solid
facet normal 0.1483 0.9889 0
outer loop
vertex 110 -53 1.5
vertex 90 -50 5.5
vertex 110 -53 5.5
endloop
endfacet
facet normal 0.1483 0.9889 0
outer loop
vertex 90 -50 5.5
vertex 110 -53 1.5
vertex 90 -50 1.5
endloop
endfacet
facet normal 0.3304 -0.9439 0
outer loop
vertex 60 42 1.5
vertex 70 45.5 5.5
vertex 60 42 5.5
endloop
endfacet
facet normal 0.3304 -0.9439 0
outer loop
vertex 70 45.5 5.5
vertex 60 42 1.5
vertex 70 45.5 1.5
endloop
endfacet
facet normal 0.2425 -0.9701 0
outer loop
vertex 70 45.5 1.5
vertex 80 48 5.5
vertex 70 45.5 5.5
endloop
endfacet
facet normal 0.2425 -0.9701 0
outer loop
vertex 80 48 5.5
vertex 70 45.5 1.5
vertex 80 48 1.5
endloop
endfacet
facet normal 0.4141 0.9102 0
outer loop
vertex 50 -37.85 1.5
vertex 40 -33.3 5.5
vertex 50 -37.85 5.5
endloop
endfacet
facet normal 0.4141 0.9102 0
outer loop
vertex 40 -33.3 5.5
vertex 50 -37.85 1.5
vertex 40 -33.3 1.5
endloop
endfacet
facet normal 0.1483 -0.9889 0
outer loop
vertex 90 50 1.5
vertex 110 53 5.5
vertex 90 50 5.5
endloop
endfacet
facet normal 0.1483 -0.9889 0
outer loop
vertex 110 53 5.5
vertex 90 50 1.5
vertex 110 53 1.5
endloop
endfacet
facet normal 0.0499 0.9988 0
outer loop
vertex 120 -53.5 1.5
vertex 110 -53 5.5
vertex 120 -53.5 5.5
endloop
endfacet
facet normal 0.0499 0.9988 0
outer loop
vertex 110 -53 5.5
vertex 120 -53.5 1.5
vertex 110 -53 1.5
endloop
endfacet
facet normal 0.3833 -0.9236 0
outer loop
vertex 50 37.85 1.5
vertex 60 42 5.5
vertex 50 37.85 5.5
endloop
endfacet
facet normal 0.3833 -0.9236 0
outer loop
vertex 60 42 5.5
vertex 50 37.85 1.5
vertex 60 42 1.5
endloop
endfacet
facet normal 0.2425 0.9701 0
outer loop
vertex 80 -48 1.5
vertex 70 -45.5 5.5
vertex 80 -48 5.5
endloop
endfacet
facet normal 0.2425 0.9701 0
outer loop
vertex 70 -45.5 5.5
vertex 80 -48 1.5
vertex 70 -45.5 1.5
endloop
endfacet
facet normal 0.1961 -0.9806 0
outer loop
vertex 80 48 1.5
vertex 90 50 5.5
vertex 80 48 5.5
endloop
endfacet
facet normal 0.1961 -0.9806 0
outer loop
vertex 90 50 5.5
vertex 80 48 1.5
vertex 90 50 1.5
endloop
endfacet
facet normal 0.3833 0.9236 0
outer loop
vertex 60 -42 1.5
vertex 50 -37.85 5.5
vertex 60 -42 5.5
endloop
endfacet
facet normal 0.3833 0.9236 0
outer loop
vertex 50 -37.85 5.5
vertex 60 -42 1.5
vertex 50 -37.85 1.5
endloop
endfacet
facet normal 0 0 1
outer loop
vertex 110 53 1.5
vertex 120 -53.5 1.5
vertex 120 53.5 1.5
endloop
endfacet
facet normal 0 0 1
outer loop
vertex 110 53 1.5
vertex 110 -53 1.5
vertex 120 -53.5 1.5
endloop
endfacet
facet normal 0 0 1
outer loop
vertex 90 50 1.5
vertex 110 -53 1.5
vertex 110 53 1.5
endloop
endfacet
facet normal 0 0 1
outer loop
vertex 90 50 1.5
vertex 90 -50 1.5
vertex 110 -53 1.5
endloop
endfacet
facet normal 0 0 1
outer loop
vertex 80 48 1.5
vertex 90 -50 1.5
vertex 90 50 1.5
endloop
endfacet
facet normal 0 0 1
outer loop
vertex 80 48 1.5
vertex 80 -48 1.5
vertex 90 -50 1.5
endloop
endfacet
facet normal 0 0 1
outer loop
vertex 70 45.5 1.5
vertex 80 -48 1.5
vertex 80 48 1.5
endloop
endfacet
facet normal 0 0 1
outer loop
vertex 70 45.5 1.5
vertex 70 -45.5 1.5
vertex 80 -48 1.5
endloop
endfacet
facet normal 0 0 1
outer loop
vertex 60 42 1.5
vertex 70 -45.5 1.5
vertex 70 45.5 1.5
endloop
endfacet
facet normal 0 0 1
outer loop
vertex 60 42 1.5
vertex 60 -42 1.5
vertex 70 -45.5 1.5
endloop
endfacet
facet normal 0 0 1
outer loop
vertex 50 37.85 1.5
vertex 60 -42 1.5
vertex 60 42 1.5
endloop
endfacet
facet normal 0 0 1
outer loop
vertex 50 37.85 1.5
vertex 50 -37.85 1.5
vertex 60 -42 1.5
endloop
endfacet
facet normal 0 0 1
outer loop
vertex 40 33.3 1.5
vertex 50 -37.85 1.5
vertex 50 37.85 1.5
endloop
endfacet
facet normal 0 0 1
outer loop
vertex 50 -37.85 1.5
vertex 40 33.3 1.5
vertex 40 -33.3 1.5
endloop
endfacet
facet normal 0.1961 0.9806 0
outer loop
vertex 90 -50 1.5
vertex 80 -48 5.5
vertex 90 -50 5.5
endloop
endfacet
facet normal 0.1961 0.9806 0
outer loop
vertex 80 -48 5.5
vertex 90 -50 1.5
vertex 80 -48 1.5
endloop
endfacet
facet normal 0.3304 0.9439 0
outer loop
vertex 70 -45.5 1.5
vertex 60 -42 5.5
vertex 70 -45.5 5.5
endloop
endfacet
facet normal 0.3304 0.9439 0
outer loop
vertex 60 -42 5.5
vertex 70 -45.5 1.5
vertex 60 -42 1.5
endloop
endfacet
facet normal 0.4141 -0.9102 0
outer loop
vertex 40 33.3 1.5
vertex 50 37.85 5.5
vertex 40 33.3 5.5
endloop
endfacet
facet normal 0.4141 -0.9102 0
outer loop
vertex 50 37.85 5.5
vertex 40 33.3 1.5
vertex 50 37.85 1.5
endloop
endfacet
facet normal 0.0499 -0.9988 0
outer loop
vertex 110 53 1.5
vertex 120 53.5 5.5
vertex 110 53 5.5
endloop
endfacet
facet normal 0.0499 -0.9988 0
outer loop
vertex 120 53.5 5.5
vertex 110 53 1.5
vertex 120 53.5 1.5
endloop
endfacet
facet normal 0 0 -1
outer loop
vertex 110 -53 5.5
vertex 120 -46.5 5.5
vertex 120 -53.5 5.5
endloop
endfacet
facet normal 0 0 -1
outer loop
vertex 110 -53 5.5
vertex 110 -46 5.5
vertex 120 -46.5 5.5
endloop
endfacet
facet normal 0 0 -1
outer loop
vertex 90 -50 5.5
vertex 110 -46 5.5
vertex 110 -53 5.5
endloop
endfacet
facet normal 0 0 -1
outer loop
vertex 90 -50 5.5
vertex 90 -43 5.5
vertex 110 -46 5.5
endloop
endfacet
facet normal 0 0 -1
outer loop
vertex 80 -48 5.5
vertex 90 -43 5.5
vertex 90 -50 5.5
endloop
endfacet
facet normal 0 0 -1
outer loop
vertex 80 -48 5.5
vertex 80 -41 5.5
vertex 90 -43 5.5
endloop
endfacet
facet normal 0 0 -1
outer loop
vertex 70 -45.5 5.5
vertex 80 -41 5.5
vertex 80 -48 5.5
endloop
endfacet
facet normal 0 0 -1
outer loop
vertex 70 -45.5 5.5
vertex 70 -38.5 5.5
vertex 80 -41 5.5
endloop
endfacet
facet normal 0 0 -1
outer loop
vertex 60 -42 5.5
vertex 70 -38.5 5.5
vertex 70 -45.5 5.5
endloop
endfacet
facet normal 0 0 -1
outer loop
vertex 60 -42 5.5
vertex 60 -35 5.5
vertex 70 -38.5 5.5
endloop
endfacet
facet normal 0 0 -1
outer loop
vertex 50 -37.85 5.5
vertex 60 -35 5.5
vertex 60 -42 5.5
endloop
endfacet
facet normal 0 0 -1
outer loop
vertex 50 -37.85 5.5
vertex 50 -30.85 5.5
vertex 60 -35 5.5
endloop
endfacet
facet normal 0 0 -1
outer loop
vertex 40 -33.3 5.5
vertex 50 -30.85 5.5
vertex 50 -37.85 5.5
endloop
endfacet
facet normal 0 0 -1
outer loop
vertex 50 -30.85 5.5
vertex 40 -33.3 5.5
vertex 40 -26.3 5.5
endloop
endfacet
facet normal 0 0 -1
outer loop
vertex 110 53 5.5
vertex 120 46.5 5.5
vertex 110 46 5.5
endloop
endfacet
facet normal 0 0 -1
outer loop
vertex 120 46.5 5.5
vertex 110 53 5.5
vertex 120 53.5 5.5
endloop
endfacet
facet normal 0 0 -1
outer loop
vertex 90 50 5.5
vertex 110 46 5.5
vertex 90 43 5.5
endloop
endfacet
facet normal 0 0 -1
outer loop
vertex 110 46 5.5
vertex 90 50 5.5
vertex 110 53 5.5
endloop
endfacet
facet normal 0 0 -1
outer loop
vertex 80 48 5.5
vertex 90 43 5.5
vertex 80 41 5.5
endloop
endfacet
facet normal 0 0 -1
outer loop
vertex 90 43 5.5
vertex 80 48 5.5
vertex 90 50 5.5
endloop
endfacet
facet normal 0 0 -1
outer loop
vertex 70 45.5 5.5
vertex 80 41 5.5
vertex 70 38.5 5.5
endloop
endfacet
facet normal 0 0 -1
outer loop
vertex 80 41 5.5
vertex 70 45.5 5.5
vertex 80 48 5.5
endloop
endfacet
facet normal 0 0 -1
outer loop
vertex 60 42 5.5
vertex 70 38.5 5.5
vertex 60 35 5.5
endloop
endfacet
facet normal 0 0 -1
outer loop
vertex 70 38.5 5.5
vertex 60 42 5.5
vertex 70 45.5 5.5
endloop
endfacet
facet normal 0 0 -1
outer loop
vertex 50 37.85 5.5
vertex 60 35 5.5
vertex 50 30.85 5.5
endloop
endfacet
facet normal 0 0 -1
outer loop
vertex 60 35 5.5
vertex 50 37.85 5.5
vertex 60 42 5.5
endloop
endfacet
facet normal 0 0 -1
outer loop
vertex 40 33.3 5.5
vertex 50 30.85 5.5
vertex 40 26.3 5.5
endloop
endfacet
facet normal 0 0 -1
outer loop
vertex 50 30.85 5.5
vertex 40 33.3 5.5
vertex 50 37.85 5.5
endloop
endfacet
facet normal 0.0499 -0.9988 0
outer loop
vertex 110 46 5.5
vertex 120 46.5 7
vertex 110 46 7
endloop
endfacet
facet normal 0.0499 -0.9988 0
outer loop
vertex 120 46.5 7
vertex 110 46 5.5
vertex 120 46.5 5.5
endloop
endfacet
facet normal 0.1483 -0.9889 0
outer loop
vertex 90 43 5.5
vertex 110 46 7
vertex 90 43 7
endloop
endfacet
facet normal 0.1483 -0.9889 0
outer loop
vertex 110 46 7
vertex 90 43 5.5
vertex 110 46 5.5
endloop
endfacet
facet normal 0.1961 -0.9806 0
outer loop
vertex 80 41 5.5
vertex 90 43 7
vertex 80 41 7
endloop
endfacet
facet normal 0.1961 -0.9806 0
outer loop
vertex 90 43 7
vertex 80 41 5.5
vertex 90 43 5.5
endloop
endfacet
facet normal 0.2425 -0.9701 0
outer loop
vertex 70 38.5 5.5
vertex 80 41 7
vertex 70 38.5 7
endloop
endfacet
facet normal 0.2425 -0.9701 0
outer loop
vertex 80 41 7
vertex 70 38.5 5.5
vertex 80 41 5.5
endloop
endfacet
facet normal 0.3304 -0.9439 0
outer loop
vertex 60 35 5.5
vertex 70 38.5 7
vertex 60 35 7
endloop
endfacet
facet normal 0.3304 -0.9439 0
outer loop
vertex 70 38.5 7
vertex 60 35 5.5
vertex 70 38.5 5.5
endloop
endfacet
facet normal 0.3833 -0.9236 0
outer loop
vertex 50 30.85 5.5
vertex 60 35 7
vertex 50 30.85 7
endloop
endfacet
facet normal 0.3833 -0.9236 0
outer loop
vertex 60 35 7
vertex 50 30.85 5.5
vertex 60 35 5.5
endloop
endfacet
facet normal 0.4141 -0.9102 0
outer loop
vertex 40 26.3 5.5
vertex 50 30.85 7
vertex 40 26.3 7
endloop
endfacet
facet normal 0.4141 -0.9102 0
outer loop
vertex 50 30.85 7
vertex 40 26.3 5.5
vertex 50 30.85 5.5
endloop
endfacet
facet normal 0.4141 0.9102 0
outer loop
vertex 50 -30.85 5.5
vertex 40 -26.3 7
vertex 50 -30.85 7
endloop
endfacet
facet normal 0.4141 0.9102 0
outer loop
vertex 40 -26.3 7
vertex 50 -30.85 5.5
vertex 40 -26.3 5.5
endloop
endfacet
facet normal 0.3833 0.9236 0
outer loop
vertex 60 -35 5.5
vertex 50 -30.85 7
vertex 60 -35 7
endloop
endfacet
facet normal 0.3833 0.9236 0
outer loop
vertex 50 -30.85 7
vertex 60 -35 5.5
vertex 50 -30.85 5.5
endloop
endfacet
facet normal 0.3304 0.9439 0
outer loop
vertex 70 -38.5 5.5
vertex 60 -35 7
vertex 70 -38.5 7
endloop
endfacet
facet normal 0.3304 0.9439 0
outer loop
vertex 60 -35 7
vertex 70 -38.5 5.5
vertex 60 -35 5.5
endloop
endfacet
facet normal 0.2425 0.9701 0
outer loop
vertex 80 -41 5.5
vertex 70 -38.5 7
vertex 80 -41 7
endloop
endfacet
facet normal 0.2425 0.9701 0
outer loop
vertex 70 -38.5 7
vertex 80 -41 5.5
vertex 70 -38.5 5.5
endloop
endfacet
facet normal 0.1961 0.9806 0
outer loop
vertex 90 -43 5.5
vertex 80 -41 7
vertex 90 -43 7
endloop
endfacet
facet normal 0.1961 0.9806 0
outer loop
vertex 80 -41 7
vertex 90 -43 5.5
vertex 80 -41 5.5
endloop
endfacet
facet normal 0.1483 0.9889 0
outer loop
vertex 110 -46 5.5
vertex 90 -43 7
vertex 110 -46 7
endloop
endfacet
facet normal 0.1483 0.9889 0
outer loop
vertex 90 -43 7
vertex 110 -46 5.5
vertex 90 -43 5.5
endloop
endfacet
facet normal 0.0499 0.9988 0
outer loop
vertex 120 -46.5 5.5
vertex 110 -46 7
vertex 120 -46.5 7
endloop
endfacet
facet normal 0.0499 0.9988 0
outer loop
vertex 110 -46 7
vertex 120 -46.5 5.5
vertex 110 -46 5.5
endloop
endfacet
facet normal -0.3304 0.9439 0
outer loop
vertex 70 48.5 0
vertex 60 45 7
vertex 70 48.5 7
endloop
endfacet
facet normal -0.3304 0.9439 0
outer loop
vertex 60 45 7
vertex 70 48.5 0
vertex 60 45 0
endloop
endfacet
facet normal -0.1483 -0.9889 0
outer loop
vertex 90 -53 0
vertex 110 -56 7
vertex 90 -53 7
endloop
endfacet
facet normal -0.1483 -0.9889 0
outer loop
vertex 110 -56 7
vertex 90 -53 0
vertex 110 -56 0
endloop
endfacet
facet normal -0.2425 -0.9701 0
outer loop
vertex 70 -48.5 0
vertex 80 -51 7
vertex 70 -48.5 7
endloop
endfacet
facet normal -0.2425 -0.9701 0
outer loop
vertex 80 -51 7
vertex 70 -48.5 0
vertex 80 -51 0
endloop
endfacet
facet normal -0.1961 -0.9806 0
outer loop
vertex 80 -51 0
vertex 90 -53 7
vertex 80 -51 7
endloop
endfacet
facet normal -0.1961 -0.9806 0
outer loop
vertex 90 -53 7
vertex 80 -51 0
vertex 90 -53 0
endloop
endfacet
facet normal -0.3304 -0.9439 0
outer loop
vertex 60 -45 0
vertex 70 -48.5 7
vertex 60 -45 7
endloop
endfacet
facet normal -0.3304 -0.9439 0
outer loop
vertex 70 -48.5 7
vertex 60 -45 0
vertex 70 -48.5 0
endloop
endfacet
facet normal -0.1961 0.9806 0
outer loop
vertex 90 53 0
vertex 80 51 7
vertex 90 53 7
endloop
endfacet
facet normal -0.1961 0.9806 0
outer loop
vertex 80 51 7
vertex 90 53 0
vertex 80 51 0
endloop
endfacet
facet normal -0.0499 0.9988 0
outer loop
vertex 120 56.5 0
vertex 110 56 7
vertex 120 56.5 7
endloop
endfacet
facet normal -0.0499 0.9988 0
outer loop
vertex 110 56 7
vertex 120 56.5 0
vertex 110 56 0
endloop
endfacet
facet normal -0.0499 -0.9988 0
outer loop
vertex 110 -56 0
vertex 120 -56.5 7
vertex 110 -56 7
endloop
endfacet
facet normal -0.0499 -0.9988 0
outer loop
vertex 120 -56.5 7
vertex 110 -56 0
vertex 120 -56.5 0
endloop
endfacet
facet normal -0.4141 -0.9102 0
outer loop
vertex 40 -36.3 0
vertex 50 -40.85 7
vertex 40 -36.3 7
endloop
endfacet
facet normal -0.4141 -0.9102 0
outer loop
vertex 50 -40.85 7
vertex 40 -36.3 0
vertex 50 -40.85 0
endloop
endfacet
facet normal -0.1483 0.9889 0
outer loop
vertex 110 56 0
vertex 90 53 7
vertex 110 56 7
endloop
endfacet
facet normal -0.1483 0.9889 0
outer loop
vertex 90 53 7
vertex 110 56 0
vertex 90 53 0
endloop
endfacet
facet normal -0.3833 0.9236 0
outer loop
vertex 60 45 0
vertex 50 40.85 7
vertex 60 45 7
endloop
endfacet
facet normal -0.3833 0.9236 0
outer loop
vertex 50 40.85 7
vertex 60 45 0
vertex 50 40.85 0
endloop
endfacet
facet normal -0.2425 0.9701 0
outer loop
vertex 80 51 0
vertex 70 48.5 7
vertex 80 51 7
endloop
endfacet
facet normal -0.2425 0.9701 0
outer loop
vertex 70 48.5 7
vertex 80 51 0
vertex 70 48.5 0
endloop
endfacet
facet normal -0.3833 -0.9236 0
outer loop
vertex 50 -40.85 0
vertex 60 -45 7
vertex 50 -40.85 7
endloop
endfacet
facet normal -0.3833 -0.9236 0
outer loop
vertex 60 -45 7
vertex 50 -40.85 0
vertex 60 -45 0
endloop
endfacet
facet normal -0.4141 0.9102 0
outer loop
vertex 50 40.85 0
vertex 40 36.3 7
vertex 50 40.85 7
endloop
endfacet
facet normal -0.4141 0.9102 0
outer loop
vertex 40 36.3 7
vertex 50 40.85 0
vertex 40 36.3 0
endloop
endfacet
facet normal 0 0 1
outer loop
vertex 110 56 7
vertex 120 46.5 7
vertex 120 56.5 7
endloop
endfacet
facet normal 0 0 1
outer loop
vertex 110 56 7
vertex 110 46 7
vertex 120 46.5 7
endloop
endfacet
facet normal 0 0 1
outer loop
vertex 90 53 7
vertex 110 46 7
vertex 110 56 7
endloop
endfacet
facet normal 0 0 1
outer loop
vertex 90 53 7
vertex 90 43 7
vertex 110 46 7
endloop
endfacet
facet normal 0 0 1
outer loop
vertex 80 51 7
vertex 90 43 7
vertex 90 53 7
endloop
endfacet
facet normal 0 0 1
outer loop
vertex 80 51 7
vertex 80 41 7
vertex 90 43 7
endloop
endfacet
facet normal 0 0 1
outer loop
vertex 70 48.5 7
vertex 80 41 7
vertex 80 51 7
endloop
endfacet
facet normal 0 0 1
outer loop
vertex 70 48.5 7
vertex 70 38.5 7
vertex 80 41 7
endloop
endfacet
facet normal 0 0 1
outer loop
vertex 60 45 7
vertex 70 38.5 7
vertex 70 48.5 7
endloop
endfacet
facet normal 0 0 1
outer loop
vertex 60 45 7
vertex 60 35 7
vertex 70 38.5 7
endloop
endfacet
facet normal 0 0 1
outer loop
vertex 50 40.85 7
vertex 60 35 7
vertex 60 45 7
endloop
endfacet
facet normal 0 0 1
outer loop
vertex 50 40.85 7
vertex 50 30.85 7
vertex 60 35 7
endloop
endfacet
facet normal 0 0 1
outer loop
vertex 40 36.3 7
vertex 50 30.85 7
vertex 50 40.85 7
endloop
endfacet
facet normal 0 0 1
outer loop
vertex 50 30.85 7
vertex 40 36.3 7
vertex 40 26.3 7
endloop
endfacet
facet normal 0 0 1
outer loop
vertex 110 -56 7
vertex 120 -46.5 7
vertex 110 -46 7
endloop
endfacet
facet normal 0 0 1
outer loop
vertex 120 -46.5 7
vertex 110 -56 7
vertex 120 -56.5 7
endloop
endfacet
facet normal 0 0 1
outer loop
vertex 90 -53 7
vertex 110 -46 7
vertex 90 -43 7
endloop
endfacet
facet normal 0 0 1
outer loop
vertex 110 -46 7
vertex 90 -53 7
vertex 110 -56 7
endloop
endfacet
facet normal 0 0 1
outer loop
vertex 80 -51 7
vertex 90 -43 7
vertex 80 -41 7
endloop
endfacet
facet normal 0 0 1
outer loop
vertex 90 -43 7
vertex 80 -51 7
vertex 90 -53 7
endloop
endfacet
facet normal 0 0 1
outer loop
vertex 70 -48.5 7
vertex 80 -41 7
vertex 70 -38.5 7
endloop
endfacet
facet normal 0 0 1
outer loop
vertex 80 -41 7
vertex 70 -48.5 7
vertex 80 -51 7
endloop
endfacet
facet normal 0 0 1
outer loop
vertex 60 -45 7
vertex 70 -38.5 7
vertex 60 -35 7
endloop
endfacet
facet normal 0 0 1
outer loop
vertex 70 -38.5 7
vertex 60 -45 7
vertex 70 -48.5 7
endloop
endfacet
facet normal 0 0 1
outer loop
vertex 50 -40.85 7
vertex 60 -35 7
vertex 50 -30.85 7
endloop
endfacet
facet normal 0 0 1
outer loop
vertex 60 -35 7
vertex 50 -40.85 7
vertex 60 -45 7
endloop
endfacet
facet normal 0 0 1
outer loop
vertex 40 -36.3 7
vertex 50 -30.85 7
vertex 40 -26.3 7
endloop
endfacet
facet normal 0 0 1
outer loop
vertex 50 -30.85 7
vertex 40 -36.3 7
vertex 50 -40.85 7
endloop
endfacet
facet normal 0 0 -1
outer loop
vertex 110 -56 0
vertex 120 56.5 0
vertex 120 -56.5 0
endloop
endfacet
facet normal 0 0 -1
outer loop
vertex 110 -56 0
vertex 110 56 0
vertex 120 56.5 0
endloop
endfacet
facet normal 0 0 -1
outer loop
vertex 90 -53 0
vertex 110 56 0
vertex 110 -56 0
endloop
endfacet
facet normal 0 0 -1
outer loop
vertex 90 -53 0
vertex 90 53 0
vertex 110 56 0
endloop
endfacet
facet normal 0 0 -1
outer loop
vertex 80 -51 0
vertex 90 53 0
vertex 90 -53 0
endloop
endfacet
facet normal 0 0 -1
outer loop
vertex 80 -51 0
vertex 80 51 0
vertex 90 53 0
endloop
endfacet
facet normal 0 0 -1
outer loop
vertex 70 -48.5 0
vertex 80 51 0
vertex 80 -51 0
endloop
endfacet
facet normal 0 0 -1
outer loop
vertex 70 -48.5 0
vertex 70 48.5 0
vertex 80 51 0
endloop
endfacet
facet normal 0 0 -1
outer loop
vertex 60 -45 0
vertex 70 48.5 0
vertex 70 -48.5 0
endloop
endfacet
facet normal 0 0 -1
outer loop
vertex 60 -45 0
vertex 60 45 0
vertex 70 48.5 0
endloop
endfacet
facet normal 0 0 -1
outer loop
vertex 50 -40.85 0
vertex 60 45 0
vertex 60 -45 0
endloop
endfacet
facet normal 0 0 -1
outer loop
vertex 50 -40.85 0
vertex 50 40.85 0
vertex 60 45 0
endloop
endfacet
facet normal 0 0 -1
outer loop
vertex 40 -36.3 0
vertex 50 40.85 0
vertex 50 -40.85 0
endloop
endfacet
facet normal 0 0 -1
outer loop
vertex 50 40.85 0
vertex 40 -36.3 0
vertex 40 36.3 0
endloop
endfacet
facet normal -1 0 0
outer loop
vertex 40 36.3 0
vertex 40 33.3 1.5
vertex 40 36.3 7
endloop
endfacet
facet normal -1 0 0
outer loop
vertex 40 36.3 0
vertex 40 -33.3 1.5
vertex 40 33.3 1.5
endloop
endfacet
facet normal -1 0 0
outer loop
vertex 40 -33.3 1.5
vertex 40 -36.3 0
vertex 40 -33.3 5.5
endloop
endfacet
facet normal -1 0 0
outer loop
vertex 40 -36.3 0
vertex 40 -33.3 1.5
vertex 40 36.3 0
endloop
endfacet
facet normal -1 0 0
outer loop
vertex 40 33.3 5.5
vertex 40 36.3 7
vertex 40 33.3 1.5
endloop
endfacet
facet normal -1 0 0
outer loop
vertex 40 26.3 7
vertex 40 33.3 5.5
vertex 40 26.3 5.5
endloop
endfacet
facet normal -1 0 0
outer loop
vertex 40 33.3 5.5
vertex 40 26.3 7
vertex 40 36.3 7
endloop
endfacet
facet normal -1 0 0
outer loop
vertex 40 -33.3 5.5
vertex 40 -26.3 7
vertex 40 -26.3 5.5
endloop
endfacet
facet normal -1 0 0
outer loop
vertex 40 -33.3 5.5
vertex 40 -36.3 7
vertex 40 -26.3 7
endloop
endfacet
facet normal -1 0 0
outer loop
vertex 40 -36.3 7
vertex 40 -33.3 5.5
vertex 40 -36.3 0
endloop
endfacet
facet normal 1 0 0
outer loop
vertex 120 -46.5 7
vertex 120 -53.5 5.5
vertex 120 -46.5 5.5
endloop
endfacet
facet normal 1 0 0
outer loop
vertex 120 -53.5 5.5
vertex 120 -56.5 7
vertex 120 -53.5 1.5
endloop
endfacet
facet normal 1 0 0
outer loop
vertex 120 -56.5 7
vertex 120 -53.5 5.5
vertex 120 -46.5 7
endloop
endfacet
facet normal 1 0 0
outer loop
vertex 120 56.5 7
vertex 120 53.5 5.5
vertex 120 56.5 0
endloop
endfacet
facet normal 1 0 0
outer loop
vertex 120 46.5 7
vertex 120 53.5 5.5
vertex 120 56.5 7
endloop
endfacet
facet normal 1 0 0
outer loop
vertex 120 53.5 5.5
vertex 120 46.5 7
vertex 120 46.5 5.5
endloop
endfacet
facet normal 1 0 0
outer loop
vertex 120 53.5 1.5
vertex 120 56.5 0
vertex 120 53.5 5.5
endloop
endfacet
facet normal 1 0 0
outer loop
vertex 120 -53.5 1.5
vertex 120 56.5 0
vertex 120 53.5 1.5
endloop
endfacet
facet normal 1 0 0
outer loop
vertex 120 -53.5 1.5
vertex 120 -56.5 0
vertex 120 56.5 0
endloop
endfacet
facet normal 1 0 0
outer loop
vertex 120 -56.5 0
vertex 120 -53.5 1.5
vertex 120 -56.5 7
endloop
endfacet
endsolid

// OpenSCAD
widths = [
    0,
    24.5,
    40.6,
    52,
    62.6,
    71.7,
    80,
    87,
    92,
    96,
    99,
    102,
    103,
    104,
    104.7,
    104.9,
    105,
    105,
    105,
    105,
    105
];

steps = len(widths)-1;

sideways_tolerance = 2;
iron_edge_points = [
	for (a = [steps : -1 : 1]) [ 10*a, 0 - widths[a]/2 - sideways_tolerance ],
    [0, 0],
	for (a = [1: steps]) [ 10*a, widths[a]/2 + sideways_tolerance]
];
inset_depth = 5;
iron_center_points = [
	for (a = [steps : -1 : 1]) [ 10*a, 0 - widths[a]/2 + inset_depth ],
    [0, 0],
	for (a = [1: steps]) [ 10*a, widths[a]/2 - inset_depth]
];
wall_width = 3;
plate_points = [
	for (a = [steps : -1 : 1]) [ 10*a, 0 - widths[a]/2 - sideways_tolerance - wall_width ],
    [0, 0],
	for (a = [1: steps]) [ 10*a, widths[a]/2 + sideways_tolerance + wall_width ]
];


module iron() {
    linear_extrude(4) polygon(iron_edge_points);
    linear_extrude(10) polygon(iron_center_points);
}

module plate() {
    difference() {
        linear_extrude(4 + wall_width) polygon(plate_points);
        translate([0, 0, 1.5]) iron();
        translate([0,-40,-5]) cube([40,80,20]);
        #translate([120,-80,-5]) cube([80,160,20]);
    }
}
    

//color("grey") iron();

plate();
